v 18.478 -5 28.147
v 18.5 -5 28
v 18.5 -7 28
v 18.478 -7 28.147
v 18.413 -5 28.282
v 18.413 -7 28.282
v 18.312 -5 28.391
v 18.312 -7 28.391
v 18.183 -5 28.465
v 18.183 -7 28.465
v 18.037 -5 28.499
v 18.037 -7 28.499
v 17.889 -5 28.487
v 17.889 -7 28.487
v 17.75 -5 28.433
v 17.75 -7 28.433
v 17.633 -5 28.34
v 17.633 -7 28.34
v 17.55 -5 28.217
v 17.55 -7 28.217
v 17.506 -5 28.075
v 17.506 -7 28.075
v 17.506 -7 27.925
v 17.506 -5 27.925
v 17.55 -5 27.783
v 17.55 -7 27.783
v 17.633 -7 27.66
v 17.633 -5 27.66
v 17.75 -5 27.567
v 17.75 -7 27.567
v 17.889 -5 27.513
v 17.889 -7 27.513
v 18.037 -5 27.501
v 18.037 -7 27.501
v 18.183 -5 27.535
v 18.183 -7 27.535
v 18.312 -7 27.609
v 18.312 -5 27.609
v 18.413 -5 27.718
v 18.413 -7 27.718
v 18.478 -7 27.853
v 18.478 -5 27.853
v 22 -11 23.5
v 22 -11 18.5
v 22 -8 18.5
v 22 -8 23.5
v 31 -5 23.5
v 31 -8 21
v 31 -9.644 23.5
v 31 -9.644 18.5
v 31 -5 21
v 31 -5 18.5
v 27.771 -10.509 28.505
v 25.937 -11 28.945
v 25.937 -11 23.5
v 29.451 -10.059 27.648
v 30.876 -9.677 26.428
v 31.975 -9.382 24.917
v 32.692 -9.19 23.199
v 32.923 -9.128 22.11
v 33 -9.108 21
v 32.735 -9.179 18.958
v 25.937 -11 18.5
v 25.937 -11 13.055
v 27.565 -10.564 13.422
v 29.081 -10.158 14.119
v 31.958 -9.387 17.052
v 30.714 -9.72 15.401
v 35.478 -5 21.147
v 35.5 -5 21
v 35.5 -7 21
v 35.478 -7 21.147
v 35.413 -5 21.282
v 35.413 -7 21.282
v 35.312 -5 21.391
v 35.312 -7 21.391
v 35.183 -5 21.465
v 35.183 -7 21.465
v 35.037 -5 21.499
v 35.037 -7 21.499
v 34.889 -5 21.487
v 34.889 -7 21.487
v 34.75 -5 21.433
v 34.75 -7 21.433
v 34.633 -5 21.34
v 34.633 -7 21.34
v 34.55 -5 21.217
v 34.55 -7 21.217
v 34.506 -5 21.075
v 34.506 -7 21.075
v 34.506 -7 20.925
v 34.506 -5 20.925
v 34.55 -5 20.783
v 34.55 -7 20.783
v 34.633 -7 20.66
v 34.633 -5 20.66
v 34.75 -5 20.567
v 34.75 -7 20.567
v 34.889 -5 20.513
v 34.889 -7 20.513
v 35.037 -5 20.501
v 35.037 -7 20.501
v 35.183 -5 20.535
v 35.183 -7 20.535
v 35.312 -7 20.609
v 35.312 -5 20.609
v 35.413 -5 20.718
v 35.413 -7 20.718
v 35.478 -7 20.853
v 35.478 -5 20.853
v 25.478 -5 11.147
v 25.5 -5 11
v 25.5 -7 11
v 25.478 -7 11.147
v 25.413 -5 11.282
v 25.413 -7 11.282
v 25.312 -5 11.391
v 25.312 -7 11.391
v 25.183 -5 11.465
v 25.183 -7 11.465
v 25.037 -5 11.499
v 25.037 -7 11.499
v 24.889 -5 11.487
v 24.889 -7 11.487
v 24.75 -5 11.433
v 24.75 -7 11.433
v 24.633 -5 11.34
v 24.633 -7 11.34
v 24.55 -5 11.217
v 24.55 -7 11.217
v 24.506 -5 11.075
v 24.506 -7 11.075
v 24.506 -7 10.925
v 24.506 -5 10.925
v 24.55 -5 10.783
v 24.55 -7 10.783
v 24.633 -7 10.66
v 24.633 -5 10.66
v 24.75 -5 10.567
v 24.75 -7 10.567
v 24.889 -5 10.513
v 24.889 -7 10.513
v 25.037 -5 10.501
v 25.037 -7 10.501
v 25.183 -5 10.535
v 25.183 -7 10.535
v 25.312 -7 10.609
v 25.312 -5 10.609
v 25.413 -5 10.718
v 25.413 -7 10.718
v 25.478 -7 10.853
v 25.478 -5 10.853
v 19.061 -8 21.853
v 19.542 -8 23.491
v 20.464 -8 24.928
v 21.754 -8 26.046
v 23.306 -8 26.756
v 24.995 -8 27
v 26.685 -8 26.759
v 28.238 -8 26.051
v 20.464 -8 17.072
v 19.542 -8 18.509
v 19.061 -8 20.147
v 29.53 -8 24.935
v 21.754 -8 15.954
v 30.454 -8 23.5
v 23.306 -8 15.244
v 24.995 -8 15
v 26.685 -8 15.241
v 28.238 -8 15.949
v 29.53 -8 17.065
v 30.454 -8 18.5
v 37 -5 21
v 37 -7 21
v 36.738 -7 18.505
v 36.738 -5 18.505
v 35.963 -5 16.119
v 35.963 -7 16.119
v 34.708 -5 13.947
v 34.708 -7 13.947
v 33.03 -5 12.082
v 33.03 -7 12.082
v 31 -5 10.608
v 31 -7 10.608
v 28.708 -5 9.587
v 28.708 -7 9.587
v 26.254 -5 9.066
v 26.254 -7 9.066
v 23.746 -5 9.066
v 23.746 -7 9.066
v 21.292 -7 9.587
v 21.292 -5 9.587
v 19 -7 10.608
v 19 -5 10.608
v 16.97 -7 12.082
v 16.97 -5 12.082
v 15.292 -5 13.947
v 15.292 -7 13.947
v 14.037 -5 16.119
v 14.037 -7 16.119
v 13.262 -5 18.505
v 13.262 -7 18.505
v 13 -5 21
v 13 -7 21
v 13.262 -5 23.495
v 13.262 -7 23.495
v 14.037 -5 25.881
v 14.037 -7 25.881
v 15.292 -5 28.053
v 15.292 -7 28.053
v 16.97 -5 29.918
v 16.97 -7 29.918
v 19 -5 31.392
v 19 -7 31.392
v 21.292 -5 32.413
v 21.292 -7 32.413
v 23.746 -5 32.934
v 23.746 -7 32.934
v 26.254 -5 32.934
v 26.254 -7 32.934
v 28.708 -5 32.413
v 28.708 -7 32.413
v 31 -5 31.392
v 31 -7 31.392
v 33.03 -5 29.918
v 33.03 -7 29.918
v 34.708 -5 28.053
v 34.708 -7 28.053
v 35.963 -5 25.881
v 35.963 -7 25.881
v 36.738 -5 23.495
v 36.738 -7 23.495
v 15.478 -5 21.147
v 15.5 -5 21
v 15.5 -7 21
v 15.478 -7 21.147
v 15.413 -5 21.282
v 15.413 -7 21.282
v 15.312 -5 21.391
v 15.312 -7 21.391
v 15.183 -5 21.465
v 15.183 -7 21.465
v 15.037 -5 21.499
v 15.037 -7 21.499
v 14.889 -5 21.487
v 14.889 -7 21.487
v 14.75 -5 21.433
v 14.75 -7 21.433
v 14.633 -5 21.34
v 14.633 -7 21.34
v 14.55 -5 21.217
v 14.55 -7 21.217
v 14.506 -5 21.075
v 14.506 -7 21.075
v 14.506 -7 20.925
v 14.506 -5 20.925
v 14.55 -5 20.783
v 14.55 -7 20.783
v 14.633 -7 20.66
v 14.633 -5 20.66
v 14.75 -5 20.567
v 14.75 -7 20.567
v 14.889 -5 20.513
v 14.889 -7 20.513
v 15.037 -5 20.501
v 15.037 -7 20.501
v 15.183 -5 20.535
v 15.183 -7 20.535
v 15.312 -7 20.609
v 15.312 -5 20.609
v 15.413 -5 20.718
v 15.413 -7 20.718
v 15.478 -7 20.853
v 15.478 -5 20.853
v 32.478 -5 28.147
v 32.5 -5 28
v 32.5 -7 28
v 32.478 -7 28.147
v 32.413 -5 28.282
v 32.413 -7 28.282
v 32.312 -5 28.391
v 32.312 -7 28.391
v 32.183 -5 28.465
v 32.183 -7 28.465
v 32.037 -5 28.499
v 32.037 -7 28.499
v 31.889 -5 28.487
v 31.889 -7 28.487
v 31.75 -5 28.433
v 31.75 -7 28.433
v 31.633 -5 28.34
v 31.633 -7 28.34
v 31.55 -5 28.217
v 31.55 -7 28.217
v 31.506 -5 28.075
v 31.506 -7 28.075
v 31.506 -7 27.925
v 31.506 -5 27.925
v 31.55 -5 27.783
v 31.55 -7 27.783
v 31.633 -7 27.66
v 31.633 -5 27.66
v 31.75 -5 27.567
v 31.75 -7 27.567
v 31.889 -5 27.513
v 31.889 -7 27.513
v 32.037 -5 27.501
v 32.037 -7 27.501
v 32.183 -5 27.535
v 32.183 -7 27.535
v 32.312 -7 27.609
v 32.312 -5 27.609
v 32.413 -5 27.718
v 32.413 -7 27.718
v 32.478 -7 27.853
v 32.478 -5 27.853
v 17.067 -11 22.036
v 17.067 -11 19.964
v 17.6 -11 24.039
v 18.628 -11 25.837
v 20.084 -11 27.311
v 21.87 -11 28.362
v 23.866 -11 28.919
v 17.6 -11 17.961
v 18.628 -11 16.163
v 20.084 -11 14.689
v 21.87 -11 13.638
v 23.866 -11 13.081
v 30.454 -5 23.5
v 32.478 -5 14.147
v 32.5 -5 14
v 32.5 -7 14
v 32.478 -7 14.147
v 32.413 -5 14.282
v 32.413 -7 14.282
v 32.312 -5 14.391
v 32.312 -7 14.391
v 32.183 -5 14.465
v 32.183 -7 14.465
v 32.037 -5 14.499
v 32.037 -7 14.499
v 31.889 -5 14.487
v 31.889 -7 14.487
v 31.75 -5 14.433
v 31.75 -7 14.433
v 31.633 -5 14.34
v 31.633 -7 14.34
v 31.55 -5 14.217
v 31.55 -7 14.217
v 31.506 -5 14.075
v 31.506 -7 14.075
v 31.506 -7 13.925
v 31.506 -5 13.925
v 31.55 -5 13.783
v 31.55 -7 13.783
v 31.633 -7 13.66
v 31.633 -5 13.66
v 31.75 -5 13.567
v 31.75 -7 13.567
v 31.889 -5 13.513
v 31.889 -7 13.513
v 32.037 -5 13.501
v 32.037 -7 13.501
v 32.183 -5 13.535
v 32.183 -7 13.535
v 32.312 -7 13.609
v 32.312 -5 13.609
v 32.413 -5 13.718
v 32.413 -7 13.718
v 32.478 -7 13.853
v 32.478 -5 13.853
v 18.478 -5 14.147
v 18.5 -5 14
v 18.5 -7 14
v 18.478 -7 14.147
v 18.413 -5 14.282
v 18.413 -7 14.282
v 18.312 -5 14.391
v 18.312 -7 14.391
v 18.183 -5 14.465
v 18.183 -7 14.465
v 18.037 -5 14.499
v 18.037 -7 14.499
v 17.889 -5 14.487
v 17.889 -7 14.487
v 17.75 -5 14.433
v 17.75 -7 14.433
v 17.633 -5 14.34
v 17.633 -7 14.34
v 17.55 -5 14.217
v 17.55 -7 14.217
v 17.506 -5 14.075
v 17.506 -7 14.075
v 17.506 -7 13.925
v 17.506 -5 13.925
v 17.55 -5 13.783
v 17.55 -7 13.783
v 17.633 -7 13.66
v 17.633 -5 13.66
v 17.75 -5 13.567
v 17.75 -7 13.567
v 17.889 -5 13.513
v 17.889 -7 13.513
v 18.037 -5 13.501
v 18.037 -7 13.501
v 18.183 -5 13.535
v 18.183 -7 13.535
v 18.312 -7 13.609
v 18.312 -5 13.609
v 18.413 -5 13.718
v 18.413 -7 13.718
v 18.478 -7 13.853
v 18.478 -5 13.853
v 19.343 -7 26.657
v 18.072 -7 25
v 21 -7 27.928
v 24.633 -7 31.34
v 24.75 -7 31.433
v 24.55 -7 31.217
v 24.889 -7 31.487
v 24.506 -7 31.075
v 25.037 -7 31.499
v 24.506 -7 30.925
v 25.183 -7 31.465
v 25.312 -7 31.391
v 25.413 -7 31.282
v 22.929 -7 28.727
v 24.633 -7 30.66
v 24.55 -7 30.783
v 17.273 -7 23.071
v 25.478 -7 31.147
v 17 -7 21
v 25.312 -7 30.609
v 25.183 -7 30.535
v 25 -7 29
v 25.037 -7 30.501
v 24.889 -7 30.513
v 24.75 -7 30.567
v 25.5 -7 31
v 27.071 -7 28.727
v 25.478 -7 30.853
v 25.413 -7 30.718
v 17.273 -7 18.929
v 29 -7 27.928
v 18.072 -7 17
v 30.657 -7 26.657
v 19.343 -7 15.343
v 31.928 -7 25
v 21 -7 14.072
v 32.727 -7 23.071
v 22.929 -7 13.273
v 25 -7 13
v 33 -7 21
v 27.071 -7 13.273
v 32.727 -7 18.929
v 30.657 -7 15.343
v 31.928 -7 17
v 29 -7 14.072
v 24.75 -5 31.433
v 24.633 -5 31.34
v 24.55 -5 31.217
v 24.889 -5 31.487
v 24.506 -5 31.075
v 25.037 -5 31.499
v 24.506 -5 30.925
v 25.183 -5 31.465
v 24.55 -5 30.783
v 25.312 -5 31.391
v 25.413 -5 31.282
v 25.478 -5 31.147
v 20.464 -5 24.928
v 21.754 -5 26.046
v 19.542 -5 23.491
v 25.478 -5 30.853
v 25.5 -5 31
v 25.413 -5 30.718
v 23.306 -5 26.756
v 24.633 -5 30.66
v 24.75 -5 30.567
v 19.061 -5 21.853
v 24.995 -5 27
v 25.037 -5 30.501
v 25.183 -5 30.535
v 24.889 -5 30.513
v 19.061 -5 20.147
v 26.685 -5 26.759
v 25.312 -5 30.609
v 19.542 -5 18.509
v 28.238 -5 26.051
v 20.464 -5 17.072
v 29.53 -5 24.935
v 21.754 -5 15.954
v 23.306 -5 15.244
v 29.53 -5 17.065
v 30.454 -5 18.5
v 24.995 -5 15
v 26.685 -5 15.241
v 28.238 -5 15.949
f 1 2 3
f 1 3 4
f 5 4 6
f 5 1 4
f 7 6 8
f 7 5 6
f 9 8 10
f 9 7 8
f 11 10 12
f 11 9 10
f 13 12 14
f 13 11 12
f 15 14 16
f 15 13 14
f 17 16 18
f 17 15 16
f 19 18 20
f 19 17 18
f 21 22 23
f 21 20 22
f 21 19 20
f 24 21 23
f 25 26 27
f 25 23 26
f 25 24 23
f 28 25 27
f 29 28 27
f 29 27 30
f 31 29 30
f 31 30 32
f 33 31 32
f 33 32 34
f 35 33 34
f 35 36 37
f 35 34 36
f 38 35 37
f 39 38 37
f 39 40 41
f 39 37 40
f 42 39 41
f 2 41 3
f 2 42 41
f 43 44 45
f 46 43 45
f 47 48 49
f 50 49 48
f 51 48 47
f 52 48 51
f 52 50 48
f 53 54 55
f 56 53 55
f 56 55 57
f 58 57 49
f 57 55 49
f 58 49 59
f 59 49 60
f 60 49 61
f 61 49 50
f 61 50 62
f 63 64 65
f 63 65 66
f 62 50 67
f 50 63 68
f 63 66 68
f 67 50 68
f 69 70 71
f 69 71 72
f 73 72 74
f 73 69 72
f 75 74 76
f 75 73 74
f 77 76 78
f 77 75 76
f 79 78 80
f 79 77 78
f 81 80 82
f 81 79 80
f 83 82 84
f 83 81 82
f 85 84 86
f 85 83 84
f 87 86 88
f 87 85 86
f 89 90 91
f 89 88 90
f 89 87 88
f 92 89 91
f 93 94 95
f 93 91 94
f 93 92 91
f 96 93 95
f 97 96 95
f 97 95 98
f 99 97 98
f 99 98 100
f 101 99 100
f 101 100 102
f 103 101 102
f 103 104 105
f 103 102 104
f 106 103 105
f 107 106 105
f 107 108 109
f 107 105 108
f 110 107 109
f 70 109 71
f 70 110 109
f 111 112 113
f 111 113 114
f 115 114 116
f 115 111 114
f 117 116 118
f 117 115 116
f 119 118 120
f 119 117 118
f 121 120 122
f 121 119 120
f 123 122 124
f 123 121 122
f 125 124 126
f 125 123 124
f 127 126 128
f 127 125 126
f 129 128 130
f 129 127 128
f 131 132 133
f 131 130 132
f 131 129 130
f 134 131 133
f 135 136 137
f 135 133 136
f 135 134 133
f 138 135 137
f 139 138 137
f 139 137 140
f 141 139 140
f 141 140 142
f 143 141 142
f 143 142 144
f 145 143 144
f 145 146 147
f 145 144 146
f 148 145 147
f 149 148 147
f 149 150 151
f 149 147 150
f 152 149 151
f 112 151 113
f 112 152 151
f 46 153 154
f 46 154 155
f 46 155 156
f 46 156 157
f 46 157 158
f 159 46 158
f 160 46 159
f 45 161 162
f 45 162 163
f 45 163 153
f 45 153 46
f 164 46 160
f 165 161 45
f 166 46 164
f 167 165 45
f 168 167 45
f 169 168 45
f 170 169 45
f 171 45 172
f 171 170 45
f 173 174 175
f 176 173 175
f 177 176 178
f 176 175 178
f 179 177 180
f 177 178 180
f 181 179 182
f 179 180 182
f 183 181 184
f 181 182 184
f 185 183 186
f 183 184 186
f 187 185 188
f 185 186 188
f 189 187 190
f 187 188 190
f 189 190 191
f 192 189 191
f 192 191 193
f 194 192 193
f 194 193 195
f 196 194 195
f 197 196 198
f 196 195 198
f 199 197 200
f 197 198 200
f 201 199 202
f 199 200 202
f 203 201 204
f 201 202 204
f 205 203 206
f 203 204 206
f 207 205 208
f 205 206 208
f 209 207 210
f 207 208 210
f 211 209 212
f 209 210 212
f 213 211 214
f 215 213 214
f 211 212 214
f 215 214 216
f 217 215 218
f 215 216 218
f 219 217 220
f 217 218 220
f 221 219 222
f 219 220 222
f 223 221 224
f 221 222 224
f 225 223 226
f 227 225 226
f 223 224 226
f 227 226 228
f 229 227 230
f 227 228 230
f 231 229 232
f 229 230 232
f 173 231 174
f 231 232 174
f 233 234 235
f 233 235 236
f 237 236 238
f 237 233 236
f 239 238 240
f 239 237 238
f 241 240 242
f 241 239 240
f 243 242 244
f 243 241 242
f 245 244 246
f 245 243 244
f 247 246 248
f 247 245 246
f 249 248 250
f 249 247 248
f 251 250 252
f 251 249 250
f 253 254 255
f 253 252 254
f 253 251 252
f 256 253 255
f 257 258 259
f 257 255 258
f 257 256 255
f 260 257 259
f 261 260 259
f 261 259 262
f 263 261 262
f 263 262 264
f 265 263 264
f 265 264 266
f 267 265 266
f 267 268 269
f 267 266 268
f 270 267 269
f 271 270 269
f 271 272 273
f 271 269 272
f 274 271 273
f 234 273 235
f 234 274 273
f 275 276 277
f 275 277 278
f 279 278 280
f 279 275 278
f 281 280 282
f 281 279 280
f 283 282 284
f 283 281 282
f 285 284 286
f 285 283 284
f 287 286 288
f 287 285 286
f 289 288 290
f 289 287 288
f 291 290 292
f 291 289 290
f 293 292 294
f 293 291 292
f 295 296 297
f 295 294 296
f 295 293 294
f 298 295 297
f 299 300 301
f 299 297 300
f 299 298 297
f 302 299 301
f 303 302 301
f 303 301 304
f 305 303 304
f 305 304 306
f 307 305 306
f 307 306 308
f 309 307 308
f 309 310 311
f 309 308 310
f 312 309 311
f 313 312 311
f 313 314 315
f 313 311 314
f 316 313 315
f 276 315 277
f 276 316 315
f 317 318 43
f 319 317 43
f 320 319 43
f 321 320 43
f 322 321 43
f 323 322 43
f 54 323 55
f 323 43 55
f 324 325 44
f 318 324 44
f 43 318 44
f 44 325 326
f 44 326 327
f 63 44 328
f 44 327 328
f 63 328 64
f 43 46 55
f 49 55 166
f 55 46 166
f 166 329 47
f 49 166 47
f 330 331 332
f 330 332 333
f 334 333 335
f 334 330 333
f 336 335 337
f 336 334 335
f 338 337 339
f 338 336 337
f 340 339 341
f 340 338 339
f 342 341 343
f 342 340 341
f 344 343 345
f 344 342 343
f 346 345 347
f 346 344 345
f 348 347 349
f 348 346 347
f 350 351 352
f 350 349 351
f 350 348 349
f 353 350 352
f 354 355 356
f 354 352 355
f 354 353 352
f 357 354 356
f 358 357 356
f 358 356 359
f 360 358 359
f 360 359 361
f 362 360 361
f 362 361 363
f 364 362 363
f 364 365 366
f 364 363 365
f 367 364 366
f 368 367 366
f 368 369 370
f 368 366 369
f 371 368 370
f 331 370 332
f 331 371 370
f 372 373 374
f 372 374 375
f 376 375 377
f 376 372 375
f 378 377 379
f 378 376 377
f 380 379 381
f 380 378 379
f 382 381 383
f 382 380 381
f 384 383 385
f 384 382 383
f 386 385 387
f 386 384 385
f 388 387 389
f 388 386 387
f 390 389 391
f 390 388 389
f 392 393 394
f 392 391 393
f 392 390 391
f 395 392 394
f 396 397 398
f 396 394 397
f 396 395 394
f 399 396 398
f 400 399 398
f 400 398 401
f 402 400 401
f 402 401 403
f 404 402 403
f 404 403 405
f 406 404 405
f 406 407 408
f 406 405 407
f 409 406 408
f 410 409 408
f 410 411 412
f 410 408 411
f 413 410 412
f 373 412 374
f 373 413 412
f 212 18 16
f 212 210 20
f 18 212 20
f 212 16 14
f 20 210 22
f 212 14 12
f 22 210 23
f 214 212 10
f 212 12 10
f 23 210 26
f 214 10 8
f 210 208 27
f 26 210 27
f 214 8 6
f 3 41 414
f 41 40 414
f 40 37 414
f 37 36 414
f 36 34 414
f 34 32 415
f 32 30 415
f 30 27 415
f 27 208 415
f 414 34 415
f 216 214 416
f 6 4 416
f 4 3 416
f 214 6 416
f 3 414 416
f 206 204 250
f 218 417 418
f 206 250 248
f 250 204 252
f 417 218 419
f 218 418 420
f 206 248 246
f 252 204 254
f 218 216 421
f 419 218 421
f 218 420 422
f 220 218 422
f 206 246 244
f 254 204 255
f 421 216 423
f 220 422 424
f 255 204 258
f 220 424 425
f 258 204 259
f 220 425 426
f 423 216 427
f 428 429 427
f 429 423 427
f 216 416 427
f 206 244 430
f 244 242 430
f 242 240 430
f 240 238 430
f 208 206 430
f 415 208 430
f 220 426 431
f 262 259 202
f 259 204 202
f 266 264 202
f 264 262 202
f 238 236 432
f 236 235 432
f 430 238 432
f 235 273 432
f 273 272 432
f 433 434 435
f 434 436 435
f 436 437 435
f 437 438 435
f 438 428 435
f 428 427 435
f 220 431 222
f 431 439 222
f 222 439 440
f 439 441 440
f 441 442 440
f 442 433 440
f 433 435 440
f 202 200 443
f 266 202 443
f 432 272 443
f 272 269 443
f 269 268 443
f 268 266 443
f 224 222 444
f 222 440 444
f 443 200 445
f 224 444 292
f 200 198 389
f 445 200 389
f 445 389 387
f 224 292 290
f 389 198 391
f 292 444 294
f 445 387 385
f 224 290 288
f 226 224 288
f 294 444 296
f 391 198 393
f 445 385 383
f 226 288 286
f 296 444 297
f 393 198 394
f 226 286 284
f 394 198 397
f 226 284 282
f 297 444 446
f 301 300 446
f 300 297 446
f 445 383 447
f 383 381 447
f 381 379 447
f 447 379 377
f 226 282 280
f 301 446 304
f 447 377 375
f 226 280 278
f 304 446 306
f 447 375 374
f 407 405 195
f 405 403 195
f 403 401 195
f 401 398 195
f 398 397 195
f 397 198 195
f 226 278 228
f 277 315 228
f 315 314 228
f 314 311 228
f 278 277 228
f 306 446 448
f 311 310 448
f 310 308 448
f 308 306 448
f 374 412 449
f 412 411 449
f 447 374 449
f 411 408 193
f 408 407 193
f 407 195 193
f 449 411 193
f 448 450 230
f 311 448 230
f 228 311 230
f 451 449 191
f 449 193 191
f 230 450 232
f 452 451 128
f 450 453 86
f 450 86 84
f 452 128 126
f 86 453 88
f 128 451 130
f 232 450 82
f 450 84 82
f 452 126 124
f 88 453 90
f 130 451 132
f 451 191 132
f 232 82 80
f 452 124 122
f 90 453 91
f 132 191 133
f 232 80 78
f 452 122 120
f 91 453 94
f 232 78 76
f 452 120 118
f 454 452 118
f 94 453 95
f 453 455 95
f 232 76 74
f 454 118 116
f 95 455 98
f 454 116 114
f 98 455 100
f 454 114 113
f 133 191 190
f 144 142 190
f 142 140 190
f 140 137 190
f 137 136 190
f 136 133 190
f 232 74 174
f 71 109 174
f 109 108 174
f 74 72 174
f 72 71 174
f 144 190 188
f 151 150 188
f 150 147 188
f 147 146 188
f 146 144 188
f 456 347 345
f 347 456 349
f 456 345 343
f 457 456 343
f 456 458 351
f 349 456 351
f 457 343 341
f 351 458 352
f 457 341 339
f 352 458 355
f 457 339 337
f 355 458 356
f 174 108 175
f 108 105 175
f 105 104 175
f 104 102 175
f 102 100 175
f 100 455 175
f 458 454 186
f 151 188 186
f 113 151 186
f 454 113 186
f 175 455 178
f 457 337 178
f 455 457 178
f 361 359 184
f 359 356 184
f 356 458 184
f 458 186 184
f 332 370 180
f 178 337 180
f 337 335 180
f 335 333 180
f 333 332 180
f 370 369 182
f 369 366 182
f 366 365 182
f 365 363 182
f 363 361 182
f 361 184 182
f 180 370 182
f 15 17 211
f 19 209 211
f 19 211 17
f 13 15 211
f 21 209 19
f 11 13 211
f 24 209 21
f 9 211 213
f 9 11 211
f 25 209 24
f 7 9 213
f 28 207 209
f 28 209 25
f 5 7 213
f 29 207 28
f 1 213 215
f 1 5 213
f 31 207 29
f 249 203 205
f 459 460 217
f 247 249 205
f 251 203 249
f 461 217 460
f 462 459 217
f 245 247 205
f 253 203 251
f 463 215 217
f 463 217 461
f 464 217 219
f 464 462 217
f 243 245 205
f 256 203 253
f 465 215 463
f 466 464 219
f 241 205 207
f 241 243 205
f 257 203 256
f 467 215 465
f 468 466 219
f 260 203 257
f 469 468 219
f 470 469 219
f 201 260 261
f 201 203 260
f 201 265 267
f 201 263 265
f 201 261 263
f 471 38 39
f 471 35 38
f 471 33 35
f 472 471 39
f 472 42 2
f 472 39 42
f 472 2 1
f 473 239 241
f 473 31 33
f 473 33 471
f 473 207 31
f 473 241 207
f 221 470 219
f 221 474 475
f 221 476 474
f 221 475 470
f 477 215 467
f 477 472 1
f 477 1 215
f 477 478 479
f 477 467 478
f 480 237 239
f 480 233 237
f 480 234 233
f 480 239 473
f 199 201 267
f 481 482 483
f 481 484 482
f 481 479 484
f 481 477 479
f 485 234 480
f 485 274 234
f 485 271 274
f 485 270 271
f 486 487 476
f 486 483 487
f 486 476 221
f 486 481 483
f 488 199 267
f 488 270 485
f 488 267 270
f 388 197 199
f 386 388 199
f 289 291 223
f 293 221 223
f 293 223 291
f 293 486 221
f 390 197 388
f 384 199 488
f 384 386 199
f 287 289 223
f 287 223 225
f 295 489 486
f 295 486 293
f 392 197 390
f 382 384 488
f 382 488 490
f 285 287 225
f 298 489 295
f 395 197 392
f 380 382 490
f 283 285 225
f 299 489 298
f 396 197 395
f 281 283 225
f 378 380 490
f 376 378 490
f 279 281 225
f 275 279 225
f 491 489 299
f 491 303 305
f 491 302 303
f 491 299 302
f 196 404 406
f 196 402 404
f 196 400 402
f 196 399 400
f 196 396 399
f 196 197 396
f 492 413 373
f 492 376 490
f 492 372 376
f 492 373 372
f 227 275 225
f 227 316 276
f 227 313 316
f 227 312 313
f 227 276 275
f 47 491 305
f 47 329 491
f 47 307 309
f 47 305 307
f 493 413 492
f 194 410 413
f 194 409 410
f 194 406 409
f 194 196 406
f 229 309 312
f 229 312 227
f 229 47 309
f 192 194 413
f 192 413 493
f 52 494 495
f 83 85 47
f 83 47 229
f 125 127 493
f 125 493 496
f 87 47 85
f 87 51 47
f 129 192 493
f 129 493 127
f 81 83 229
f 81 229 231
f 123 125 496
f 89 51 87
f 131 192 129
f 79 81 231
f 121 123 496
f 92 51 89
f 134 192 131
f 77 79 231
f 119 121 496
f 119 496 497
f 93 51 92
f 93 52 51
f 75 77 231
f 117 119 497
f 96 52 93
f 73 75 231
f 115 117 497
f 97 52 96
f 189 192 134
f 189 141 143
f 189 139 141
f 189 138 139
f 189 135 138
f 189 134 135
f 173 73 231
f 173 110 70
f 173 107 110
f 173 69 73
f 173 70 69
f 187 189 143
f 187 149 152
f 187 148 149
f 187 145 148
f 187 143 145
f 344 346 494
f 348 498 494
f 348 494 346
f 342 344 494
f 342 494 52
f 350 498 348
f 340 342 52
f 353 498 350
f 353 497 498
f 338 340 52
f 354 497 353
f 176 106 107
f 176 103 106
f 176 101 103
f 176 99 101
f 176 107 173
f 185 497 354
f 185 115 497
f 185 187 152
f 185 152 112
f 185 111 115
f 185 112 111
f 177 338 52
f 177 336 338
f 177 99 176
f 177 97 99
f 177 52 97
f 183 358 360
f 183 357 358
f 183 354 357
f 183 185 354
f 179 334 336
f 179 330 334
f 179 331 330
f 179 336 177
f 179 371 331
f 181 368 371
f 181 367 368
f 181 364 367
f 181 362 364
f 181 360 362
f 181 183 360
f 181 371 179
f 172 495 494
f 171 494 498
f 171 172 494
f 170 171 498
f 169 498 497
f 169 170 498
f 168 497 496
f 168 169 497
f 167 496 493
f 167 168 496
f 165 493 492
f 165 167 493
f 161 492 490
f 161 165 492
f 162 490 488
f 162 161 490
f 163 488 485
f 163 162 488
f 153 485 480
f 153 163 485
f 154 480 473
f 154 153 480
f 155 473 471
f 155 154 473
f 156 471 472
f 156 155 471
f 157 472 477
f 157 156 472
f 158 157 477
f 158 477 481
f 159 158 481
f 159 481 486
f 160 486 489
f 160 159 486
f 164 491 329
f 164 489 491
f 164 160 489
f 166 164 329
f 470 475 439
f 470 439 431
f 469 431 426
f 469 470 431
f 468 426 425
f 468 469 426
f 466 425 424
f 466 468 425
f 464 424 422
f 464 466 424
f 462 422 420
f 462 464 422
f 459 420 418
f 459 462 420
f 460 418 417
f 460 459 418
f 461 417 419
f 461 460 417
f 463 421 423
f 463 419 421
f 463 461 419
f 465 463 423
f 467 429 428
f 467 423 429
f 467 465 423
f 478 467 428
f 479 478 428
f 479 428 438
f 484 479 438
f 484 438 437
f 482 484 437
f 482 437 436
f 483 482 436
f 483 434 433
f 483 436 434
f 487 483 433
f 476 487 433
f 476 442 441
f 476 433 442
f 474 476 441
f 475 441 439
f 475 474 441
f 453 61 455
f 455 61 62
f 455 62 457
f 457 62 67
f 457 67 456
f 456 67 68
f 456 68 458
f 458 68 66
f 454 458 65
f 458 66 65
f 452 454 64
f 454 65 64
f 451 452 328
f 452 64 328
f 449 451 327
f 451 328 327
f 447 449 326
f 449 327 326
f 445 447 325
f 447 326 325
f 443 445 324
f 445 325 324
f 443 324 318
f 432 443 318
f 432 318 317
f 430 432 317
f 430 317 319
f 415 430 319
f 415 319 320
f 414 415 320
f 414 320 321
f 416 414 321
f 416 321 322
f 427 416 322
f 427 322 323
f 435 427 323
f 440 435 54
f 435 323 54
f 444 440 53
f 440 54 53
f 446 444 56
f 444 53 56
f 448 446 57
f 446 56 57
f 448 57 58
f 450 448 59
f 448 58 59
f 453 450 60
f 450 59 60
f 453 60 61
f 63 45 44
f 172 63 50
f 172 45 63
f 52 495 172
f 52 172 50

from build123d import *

# Parameters (mm, degrees)
BOX014_W               = 16
BOX014_H               = 4
BOX014_DEPTH           = 16
BOX014_PLACEMENT_ANGLE = 15
CYLINDER039_R          = 0.5
CYLINDER039_DEPTH      = 20
CYLINDER038_R          = 0.5
CYLINDER038_DEPTH      = 20
CYLINDER034_R          = 0.5
CYLINDER034_DEPTH      = 20
CYLINDER035_R          = 0.5
CYLINDER035_DEPTH      = 20
CYLINDER040_R          = 0.5
CYLINDER040_DEPTH      = 20
CYLINDER036_R          = 0.5
CYLINDER036_DEPTH      = 20
CYLINDER037_R          = 0.5
CYLINDER037_DEPTH      = 20
CYLINDER033_R          = 0.5
CYLINDER033_DEPTH      = 20
CYLINDER030_R          = 6
CYLINDER030_DEPTH      = 14
BOX013_W               = 9
BOX013_H               = 10
BOX013_DEPTH           = 5
CYLINDER031_R          = 8
CYLINDER031_DEPTH      = 6
CYLINDER032_R          = 12
CYLINDER032_DEPTH      = 2


with BuildPart() as cube014:
    # Box014 → Box014 (new body)
    with BuildSketch(Plane.XY):
        with Locations((8, 2)):
            Rectangle(BOX014_W, BOX014_H)
    extrude(amount=BOX014_DEPTH)


with BuildPart() as cube014_1:
    # Box014 placement: moved
    add(cube014.part.moved(Location((19, -17, 13))).rotate(Axis((19, -17, 13), (0, 0, 1)), BOX014_PLACEMENT_ANGLE))


with BuildPart() as cylinder039:
    # Cylinder039 → Cylinder039 (new body)
    with BuildSketch(Plane(origin=(32, 7, 14), x_dir=(1, 0, 0), z_dir=(0, -1, 0))):
        Circle(CYLINDER039_R)
    extrude(amount=CYLINDER039_DEPTH)


with BuildPart() as cylinder038:
    # Cylinder038 → Cylinder038 (new body)
    with BuildSketch(Plane(origin=(18, 7, 14), x_dir=(1, 0, 0), z_dir=(0, -1, 0))):
        Circle(CYLINDER038_R)
    extrude(amount=CYLINDER038_DEPTH)


with BuildPart() as cylinder034:
    # Cylinder034 → Cylinder034 (new body)
    with BuildSketch(Plane(origin=(35, 7, 21), x_dir=(1, 0, 0), z_dir=(0, -1, 0))):
        Circle(CYLINDER034_R)
    extrude(amount=CYLINDER034_DEPTH)


with BuildPart() as cylinder035:
    # Cylinder035 → Cylinder035 (new body)
    with BuildSketch(Plane(origin=(25, 7, 11), x_dir=(1, 0, 0), z_dir=(0, -1, 0))):
        Circle(CYLINDER035_R)
    extrude(amount=CYLINDER035_DEPTH)


with BuildPart() as cylinder040:
    # Cylinder040 → Cylinder040 (new body)
    with BuildSketch(Plane(origin=(18, 7, 28), x_dir=(1, 0, 0), z_dir=(0, -1, 0))):
        Circle(CYLINDER040_R)
    extrude(amount=CYLINDER040_DEPTH)


with BuildPart() as cylinder036:
    # Cylinder036 → Cylinder036 (new body)
    with BuildSketch(Plane(origin=(25, 7, 31), x_dir=(1, 0, 0), z_dir=(0, -1, 0))):
        Circle(CYLINDER036_R)
    extrude(amount=CYLINDER036_DEPTH)


with BuildPart() as cylinder037:
    # Cylinder037 → Cylinder037 (new body)
    with BuildSketch(Plane(origin=(32, 7, 28), x_dir=(1, 0, 0), z_dir=(0, -1, 0))):
        Circle(CYLINDER037_R)
    extrude(amount=CYLINDER037_DEPTH)


with BuildPart() as fusion033:
    # Cylinder033 → Cylinder033 (new body)
    with BuildSketch(Plane(origin=(15, 7, 21), x_dir=(1, 0, 0), z_dir=(0, -1, 0))):
        Circle(CYLINDER033_R)
    extrude(amount=CYLINDER033_DEPTH)

    # Fusion033: union Cylinder039, Cylinder038, Cylinder034, Cylinder035, Cylinder040, Cylinder036, Cylinder037
    add(cylinder039.part)
    add(cylinder038.part)
    add(cylinder034.part)
    add(cylinder035.part)
    add(cylinder040.part)
    add(cylinder036.part)
    add(cylinder037.part)


with BuildPart() as cylinder030:
    # Cylinder030 → Cylinder030 (new body)
    with BuildSketch(Plane(origin=(25, -8, 21), x_dir=(1, 0, 0), z_dir=(0, 1, 0))):
        Circle(CYLINDER030_R)
    extrude(amount=CYLINDER030_DEPTH)


with BuildPart() as fusion032:
    # Box013 → Box013 (new body)
    with BuildSketch(Plane(origin=(22, -13, 18.5), x_dir=(1, 0, 0), z_dir=(0, 0, 1))):
        with Locations((4.5, 5)):
            Rectangle(BOX013_W, BOX013_H)
    extrude(amount=BOX013_DEPTH)

    # Fusion032: union Cylinder030
    add(cylinder030.part)


with BuildPart() as cylinder031:
    # Cylinder031 → Cylinder031 (new body)
    with BuildSketch(Plane(origin=(25, -11, 21), x_dir=(1, 0, 0), z_dir=(0, 1, 0))):
        Circle(CYLINDER031_R)
    extrude(amount=CYLINDER031_DEPTH)


with BuildPart() as springflange001:
    # Cylinder032 → Cylinder032 (new body)
    with BuildSketch(Plane(origin=(25, -7, 21), x_dir=(1, 0, 0), z_dir=(0, 1, 0))):
        Circle(CYLINDER032_R)
    extrude(amount=CYLINDER032_DEPTH)

    # Fusion034: union Cylinder031
    add(cylinder031.part)

    # Cut022: cut Fusion032
    add(fusion032.part, mode=Mode.SUBTRACT)

    # Cut023: cut Fusion033
    add(fusion033.part, mode=Mode.SUBTRACT)

    # Cut030: cut Cube014
    add(cube014_1.part, mode=Mode.SUBTRACT)


solid = springflange001.part
